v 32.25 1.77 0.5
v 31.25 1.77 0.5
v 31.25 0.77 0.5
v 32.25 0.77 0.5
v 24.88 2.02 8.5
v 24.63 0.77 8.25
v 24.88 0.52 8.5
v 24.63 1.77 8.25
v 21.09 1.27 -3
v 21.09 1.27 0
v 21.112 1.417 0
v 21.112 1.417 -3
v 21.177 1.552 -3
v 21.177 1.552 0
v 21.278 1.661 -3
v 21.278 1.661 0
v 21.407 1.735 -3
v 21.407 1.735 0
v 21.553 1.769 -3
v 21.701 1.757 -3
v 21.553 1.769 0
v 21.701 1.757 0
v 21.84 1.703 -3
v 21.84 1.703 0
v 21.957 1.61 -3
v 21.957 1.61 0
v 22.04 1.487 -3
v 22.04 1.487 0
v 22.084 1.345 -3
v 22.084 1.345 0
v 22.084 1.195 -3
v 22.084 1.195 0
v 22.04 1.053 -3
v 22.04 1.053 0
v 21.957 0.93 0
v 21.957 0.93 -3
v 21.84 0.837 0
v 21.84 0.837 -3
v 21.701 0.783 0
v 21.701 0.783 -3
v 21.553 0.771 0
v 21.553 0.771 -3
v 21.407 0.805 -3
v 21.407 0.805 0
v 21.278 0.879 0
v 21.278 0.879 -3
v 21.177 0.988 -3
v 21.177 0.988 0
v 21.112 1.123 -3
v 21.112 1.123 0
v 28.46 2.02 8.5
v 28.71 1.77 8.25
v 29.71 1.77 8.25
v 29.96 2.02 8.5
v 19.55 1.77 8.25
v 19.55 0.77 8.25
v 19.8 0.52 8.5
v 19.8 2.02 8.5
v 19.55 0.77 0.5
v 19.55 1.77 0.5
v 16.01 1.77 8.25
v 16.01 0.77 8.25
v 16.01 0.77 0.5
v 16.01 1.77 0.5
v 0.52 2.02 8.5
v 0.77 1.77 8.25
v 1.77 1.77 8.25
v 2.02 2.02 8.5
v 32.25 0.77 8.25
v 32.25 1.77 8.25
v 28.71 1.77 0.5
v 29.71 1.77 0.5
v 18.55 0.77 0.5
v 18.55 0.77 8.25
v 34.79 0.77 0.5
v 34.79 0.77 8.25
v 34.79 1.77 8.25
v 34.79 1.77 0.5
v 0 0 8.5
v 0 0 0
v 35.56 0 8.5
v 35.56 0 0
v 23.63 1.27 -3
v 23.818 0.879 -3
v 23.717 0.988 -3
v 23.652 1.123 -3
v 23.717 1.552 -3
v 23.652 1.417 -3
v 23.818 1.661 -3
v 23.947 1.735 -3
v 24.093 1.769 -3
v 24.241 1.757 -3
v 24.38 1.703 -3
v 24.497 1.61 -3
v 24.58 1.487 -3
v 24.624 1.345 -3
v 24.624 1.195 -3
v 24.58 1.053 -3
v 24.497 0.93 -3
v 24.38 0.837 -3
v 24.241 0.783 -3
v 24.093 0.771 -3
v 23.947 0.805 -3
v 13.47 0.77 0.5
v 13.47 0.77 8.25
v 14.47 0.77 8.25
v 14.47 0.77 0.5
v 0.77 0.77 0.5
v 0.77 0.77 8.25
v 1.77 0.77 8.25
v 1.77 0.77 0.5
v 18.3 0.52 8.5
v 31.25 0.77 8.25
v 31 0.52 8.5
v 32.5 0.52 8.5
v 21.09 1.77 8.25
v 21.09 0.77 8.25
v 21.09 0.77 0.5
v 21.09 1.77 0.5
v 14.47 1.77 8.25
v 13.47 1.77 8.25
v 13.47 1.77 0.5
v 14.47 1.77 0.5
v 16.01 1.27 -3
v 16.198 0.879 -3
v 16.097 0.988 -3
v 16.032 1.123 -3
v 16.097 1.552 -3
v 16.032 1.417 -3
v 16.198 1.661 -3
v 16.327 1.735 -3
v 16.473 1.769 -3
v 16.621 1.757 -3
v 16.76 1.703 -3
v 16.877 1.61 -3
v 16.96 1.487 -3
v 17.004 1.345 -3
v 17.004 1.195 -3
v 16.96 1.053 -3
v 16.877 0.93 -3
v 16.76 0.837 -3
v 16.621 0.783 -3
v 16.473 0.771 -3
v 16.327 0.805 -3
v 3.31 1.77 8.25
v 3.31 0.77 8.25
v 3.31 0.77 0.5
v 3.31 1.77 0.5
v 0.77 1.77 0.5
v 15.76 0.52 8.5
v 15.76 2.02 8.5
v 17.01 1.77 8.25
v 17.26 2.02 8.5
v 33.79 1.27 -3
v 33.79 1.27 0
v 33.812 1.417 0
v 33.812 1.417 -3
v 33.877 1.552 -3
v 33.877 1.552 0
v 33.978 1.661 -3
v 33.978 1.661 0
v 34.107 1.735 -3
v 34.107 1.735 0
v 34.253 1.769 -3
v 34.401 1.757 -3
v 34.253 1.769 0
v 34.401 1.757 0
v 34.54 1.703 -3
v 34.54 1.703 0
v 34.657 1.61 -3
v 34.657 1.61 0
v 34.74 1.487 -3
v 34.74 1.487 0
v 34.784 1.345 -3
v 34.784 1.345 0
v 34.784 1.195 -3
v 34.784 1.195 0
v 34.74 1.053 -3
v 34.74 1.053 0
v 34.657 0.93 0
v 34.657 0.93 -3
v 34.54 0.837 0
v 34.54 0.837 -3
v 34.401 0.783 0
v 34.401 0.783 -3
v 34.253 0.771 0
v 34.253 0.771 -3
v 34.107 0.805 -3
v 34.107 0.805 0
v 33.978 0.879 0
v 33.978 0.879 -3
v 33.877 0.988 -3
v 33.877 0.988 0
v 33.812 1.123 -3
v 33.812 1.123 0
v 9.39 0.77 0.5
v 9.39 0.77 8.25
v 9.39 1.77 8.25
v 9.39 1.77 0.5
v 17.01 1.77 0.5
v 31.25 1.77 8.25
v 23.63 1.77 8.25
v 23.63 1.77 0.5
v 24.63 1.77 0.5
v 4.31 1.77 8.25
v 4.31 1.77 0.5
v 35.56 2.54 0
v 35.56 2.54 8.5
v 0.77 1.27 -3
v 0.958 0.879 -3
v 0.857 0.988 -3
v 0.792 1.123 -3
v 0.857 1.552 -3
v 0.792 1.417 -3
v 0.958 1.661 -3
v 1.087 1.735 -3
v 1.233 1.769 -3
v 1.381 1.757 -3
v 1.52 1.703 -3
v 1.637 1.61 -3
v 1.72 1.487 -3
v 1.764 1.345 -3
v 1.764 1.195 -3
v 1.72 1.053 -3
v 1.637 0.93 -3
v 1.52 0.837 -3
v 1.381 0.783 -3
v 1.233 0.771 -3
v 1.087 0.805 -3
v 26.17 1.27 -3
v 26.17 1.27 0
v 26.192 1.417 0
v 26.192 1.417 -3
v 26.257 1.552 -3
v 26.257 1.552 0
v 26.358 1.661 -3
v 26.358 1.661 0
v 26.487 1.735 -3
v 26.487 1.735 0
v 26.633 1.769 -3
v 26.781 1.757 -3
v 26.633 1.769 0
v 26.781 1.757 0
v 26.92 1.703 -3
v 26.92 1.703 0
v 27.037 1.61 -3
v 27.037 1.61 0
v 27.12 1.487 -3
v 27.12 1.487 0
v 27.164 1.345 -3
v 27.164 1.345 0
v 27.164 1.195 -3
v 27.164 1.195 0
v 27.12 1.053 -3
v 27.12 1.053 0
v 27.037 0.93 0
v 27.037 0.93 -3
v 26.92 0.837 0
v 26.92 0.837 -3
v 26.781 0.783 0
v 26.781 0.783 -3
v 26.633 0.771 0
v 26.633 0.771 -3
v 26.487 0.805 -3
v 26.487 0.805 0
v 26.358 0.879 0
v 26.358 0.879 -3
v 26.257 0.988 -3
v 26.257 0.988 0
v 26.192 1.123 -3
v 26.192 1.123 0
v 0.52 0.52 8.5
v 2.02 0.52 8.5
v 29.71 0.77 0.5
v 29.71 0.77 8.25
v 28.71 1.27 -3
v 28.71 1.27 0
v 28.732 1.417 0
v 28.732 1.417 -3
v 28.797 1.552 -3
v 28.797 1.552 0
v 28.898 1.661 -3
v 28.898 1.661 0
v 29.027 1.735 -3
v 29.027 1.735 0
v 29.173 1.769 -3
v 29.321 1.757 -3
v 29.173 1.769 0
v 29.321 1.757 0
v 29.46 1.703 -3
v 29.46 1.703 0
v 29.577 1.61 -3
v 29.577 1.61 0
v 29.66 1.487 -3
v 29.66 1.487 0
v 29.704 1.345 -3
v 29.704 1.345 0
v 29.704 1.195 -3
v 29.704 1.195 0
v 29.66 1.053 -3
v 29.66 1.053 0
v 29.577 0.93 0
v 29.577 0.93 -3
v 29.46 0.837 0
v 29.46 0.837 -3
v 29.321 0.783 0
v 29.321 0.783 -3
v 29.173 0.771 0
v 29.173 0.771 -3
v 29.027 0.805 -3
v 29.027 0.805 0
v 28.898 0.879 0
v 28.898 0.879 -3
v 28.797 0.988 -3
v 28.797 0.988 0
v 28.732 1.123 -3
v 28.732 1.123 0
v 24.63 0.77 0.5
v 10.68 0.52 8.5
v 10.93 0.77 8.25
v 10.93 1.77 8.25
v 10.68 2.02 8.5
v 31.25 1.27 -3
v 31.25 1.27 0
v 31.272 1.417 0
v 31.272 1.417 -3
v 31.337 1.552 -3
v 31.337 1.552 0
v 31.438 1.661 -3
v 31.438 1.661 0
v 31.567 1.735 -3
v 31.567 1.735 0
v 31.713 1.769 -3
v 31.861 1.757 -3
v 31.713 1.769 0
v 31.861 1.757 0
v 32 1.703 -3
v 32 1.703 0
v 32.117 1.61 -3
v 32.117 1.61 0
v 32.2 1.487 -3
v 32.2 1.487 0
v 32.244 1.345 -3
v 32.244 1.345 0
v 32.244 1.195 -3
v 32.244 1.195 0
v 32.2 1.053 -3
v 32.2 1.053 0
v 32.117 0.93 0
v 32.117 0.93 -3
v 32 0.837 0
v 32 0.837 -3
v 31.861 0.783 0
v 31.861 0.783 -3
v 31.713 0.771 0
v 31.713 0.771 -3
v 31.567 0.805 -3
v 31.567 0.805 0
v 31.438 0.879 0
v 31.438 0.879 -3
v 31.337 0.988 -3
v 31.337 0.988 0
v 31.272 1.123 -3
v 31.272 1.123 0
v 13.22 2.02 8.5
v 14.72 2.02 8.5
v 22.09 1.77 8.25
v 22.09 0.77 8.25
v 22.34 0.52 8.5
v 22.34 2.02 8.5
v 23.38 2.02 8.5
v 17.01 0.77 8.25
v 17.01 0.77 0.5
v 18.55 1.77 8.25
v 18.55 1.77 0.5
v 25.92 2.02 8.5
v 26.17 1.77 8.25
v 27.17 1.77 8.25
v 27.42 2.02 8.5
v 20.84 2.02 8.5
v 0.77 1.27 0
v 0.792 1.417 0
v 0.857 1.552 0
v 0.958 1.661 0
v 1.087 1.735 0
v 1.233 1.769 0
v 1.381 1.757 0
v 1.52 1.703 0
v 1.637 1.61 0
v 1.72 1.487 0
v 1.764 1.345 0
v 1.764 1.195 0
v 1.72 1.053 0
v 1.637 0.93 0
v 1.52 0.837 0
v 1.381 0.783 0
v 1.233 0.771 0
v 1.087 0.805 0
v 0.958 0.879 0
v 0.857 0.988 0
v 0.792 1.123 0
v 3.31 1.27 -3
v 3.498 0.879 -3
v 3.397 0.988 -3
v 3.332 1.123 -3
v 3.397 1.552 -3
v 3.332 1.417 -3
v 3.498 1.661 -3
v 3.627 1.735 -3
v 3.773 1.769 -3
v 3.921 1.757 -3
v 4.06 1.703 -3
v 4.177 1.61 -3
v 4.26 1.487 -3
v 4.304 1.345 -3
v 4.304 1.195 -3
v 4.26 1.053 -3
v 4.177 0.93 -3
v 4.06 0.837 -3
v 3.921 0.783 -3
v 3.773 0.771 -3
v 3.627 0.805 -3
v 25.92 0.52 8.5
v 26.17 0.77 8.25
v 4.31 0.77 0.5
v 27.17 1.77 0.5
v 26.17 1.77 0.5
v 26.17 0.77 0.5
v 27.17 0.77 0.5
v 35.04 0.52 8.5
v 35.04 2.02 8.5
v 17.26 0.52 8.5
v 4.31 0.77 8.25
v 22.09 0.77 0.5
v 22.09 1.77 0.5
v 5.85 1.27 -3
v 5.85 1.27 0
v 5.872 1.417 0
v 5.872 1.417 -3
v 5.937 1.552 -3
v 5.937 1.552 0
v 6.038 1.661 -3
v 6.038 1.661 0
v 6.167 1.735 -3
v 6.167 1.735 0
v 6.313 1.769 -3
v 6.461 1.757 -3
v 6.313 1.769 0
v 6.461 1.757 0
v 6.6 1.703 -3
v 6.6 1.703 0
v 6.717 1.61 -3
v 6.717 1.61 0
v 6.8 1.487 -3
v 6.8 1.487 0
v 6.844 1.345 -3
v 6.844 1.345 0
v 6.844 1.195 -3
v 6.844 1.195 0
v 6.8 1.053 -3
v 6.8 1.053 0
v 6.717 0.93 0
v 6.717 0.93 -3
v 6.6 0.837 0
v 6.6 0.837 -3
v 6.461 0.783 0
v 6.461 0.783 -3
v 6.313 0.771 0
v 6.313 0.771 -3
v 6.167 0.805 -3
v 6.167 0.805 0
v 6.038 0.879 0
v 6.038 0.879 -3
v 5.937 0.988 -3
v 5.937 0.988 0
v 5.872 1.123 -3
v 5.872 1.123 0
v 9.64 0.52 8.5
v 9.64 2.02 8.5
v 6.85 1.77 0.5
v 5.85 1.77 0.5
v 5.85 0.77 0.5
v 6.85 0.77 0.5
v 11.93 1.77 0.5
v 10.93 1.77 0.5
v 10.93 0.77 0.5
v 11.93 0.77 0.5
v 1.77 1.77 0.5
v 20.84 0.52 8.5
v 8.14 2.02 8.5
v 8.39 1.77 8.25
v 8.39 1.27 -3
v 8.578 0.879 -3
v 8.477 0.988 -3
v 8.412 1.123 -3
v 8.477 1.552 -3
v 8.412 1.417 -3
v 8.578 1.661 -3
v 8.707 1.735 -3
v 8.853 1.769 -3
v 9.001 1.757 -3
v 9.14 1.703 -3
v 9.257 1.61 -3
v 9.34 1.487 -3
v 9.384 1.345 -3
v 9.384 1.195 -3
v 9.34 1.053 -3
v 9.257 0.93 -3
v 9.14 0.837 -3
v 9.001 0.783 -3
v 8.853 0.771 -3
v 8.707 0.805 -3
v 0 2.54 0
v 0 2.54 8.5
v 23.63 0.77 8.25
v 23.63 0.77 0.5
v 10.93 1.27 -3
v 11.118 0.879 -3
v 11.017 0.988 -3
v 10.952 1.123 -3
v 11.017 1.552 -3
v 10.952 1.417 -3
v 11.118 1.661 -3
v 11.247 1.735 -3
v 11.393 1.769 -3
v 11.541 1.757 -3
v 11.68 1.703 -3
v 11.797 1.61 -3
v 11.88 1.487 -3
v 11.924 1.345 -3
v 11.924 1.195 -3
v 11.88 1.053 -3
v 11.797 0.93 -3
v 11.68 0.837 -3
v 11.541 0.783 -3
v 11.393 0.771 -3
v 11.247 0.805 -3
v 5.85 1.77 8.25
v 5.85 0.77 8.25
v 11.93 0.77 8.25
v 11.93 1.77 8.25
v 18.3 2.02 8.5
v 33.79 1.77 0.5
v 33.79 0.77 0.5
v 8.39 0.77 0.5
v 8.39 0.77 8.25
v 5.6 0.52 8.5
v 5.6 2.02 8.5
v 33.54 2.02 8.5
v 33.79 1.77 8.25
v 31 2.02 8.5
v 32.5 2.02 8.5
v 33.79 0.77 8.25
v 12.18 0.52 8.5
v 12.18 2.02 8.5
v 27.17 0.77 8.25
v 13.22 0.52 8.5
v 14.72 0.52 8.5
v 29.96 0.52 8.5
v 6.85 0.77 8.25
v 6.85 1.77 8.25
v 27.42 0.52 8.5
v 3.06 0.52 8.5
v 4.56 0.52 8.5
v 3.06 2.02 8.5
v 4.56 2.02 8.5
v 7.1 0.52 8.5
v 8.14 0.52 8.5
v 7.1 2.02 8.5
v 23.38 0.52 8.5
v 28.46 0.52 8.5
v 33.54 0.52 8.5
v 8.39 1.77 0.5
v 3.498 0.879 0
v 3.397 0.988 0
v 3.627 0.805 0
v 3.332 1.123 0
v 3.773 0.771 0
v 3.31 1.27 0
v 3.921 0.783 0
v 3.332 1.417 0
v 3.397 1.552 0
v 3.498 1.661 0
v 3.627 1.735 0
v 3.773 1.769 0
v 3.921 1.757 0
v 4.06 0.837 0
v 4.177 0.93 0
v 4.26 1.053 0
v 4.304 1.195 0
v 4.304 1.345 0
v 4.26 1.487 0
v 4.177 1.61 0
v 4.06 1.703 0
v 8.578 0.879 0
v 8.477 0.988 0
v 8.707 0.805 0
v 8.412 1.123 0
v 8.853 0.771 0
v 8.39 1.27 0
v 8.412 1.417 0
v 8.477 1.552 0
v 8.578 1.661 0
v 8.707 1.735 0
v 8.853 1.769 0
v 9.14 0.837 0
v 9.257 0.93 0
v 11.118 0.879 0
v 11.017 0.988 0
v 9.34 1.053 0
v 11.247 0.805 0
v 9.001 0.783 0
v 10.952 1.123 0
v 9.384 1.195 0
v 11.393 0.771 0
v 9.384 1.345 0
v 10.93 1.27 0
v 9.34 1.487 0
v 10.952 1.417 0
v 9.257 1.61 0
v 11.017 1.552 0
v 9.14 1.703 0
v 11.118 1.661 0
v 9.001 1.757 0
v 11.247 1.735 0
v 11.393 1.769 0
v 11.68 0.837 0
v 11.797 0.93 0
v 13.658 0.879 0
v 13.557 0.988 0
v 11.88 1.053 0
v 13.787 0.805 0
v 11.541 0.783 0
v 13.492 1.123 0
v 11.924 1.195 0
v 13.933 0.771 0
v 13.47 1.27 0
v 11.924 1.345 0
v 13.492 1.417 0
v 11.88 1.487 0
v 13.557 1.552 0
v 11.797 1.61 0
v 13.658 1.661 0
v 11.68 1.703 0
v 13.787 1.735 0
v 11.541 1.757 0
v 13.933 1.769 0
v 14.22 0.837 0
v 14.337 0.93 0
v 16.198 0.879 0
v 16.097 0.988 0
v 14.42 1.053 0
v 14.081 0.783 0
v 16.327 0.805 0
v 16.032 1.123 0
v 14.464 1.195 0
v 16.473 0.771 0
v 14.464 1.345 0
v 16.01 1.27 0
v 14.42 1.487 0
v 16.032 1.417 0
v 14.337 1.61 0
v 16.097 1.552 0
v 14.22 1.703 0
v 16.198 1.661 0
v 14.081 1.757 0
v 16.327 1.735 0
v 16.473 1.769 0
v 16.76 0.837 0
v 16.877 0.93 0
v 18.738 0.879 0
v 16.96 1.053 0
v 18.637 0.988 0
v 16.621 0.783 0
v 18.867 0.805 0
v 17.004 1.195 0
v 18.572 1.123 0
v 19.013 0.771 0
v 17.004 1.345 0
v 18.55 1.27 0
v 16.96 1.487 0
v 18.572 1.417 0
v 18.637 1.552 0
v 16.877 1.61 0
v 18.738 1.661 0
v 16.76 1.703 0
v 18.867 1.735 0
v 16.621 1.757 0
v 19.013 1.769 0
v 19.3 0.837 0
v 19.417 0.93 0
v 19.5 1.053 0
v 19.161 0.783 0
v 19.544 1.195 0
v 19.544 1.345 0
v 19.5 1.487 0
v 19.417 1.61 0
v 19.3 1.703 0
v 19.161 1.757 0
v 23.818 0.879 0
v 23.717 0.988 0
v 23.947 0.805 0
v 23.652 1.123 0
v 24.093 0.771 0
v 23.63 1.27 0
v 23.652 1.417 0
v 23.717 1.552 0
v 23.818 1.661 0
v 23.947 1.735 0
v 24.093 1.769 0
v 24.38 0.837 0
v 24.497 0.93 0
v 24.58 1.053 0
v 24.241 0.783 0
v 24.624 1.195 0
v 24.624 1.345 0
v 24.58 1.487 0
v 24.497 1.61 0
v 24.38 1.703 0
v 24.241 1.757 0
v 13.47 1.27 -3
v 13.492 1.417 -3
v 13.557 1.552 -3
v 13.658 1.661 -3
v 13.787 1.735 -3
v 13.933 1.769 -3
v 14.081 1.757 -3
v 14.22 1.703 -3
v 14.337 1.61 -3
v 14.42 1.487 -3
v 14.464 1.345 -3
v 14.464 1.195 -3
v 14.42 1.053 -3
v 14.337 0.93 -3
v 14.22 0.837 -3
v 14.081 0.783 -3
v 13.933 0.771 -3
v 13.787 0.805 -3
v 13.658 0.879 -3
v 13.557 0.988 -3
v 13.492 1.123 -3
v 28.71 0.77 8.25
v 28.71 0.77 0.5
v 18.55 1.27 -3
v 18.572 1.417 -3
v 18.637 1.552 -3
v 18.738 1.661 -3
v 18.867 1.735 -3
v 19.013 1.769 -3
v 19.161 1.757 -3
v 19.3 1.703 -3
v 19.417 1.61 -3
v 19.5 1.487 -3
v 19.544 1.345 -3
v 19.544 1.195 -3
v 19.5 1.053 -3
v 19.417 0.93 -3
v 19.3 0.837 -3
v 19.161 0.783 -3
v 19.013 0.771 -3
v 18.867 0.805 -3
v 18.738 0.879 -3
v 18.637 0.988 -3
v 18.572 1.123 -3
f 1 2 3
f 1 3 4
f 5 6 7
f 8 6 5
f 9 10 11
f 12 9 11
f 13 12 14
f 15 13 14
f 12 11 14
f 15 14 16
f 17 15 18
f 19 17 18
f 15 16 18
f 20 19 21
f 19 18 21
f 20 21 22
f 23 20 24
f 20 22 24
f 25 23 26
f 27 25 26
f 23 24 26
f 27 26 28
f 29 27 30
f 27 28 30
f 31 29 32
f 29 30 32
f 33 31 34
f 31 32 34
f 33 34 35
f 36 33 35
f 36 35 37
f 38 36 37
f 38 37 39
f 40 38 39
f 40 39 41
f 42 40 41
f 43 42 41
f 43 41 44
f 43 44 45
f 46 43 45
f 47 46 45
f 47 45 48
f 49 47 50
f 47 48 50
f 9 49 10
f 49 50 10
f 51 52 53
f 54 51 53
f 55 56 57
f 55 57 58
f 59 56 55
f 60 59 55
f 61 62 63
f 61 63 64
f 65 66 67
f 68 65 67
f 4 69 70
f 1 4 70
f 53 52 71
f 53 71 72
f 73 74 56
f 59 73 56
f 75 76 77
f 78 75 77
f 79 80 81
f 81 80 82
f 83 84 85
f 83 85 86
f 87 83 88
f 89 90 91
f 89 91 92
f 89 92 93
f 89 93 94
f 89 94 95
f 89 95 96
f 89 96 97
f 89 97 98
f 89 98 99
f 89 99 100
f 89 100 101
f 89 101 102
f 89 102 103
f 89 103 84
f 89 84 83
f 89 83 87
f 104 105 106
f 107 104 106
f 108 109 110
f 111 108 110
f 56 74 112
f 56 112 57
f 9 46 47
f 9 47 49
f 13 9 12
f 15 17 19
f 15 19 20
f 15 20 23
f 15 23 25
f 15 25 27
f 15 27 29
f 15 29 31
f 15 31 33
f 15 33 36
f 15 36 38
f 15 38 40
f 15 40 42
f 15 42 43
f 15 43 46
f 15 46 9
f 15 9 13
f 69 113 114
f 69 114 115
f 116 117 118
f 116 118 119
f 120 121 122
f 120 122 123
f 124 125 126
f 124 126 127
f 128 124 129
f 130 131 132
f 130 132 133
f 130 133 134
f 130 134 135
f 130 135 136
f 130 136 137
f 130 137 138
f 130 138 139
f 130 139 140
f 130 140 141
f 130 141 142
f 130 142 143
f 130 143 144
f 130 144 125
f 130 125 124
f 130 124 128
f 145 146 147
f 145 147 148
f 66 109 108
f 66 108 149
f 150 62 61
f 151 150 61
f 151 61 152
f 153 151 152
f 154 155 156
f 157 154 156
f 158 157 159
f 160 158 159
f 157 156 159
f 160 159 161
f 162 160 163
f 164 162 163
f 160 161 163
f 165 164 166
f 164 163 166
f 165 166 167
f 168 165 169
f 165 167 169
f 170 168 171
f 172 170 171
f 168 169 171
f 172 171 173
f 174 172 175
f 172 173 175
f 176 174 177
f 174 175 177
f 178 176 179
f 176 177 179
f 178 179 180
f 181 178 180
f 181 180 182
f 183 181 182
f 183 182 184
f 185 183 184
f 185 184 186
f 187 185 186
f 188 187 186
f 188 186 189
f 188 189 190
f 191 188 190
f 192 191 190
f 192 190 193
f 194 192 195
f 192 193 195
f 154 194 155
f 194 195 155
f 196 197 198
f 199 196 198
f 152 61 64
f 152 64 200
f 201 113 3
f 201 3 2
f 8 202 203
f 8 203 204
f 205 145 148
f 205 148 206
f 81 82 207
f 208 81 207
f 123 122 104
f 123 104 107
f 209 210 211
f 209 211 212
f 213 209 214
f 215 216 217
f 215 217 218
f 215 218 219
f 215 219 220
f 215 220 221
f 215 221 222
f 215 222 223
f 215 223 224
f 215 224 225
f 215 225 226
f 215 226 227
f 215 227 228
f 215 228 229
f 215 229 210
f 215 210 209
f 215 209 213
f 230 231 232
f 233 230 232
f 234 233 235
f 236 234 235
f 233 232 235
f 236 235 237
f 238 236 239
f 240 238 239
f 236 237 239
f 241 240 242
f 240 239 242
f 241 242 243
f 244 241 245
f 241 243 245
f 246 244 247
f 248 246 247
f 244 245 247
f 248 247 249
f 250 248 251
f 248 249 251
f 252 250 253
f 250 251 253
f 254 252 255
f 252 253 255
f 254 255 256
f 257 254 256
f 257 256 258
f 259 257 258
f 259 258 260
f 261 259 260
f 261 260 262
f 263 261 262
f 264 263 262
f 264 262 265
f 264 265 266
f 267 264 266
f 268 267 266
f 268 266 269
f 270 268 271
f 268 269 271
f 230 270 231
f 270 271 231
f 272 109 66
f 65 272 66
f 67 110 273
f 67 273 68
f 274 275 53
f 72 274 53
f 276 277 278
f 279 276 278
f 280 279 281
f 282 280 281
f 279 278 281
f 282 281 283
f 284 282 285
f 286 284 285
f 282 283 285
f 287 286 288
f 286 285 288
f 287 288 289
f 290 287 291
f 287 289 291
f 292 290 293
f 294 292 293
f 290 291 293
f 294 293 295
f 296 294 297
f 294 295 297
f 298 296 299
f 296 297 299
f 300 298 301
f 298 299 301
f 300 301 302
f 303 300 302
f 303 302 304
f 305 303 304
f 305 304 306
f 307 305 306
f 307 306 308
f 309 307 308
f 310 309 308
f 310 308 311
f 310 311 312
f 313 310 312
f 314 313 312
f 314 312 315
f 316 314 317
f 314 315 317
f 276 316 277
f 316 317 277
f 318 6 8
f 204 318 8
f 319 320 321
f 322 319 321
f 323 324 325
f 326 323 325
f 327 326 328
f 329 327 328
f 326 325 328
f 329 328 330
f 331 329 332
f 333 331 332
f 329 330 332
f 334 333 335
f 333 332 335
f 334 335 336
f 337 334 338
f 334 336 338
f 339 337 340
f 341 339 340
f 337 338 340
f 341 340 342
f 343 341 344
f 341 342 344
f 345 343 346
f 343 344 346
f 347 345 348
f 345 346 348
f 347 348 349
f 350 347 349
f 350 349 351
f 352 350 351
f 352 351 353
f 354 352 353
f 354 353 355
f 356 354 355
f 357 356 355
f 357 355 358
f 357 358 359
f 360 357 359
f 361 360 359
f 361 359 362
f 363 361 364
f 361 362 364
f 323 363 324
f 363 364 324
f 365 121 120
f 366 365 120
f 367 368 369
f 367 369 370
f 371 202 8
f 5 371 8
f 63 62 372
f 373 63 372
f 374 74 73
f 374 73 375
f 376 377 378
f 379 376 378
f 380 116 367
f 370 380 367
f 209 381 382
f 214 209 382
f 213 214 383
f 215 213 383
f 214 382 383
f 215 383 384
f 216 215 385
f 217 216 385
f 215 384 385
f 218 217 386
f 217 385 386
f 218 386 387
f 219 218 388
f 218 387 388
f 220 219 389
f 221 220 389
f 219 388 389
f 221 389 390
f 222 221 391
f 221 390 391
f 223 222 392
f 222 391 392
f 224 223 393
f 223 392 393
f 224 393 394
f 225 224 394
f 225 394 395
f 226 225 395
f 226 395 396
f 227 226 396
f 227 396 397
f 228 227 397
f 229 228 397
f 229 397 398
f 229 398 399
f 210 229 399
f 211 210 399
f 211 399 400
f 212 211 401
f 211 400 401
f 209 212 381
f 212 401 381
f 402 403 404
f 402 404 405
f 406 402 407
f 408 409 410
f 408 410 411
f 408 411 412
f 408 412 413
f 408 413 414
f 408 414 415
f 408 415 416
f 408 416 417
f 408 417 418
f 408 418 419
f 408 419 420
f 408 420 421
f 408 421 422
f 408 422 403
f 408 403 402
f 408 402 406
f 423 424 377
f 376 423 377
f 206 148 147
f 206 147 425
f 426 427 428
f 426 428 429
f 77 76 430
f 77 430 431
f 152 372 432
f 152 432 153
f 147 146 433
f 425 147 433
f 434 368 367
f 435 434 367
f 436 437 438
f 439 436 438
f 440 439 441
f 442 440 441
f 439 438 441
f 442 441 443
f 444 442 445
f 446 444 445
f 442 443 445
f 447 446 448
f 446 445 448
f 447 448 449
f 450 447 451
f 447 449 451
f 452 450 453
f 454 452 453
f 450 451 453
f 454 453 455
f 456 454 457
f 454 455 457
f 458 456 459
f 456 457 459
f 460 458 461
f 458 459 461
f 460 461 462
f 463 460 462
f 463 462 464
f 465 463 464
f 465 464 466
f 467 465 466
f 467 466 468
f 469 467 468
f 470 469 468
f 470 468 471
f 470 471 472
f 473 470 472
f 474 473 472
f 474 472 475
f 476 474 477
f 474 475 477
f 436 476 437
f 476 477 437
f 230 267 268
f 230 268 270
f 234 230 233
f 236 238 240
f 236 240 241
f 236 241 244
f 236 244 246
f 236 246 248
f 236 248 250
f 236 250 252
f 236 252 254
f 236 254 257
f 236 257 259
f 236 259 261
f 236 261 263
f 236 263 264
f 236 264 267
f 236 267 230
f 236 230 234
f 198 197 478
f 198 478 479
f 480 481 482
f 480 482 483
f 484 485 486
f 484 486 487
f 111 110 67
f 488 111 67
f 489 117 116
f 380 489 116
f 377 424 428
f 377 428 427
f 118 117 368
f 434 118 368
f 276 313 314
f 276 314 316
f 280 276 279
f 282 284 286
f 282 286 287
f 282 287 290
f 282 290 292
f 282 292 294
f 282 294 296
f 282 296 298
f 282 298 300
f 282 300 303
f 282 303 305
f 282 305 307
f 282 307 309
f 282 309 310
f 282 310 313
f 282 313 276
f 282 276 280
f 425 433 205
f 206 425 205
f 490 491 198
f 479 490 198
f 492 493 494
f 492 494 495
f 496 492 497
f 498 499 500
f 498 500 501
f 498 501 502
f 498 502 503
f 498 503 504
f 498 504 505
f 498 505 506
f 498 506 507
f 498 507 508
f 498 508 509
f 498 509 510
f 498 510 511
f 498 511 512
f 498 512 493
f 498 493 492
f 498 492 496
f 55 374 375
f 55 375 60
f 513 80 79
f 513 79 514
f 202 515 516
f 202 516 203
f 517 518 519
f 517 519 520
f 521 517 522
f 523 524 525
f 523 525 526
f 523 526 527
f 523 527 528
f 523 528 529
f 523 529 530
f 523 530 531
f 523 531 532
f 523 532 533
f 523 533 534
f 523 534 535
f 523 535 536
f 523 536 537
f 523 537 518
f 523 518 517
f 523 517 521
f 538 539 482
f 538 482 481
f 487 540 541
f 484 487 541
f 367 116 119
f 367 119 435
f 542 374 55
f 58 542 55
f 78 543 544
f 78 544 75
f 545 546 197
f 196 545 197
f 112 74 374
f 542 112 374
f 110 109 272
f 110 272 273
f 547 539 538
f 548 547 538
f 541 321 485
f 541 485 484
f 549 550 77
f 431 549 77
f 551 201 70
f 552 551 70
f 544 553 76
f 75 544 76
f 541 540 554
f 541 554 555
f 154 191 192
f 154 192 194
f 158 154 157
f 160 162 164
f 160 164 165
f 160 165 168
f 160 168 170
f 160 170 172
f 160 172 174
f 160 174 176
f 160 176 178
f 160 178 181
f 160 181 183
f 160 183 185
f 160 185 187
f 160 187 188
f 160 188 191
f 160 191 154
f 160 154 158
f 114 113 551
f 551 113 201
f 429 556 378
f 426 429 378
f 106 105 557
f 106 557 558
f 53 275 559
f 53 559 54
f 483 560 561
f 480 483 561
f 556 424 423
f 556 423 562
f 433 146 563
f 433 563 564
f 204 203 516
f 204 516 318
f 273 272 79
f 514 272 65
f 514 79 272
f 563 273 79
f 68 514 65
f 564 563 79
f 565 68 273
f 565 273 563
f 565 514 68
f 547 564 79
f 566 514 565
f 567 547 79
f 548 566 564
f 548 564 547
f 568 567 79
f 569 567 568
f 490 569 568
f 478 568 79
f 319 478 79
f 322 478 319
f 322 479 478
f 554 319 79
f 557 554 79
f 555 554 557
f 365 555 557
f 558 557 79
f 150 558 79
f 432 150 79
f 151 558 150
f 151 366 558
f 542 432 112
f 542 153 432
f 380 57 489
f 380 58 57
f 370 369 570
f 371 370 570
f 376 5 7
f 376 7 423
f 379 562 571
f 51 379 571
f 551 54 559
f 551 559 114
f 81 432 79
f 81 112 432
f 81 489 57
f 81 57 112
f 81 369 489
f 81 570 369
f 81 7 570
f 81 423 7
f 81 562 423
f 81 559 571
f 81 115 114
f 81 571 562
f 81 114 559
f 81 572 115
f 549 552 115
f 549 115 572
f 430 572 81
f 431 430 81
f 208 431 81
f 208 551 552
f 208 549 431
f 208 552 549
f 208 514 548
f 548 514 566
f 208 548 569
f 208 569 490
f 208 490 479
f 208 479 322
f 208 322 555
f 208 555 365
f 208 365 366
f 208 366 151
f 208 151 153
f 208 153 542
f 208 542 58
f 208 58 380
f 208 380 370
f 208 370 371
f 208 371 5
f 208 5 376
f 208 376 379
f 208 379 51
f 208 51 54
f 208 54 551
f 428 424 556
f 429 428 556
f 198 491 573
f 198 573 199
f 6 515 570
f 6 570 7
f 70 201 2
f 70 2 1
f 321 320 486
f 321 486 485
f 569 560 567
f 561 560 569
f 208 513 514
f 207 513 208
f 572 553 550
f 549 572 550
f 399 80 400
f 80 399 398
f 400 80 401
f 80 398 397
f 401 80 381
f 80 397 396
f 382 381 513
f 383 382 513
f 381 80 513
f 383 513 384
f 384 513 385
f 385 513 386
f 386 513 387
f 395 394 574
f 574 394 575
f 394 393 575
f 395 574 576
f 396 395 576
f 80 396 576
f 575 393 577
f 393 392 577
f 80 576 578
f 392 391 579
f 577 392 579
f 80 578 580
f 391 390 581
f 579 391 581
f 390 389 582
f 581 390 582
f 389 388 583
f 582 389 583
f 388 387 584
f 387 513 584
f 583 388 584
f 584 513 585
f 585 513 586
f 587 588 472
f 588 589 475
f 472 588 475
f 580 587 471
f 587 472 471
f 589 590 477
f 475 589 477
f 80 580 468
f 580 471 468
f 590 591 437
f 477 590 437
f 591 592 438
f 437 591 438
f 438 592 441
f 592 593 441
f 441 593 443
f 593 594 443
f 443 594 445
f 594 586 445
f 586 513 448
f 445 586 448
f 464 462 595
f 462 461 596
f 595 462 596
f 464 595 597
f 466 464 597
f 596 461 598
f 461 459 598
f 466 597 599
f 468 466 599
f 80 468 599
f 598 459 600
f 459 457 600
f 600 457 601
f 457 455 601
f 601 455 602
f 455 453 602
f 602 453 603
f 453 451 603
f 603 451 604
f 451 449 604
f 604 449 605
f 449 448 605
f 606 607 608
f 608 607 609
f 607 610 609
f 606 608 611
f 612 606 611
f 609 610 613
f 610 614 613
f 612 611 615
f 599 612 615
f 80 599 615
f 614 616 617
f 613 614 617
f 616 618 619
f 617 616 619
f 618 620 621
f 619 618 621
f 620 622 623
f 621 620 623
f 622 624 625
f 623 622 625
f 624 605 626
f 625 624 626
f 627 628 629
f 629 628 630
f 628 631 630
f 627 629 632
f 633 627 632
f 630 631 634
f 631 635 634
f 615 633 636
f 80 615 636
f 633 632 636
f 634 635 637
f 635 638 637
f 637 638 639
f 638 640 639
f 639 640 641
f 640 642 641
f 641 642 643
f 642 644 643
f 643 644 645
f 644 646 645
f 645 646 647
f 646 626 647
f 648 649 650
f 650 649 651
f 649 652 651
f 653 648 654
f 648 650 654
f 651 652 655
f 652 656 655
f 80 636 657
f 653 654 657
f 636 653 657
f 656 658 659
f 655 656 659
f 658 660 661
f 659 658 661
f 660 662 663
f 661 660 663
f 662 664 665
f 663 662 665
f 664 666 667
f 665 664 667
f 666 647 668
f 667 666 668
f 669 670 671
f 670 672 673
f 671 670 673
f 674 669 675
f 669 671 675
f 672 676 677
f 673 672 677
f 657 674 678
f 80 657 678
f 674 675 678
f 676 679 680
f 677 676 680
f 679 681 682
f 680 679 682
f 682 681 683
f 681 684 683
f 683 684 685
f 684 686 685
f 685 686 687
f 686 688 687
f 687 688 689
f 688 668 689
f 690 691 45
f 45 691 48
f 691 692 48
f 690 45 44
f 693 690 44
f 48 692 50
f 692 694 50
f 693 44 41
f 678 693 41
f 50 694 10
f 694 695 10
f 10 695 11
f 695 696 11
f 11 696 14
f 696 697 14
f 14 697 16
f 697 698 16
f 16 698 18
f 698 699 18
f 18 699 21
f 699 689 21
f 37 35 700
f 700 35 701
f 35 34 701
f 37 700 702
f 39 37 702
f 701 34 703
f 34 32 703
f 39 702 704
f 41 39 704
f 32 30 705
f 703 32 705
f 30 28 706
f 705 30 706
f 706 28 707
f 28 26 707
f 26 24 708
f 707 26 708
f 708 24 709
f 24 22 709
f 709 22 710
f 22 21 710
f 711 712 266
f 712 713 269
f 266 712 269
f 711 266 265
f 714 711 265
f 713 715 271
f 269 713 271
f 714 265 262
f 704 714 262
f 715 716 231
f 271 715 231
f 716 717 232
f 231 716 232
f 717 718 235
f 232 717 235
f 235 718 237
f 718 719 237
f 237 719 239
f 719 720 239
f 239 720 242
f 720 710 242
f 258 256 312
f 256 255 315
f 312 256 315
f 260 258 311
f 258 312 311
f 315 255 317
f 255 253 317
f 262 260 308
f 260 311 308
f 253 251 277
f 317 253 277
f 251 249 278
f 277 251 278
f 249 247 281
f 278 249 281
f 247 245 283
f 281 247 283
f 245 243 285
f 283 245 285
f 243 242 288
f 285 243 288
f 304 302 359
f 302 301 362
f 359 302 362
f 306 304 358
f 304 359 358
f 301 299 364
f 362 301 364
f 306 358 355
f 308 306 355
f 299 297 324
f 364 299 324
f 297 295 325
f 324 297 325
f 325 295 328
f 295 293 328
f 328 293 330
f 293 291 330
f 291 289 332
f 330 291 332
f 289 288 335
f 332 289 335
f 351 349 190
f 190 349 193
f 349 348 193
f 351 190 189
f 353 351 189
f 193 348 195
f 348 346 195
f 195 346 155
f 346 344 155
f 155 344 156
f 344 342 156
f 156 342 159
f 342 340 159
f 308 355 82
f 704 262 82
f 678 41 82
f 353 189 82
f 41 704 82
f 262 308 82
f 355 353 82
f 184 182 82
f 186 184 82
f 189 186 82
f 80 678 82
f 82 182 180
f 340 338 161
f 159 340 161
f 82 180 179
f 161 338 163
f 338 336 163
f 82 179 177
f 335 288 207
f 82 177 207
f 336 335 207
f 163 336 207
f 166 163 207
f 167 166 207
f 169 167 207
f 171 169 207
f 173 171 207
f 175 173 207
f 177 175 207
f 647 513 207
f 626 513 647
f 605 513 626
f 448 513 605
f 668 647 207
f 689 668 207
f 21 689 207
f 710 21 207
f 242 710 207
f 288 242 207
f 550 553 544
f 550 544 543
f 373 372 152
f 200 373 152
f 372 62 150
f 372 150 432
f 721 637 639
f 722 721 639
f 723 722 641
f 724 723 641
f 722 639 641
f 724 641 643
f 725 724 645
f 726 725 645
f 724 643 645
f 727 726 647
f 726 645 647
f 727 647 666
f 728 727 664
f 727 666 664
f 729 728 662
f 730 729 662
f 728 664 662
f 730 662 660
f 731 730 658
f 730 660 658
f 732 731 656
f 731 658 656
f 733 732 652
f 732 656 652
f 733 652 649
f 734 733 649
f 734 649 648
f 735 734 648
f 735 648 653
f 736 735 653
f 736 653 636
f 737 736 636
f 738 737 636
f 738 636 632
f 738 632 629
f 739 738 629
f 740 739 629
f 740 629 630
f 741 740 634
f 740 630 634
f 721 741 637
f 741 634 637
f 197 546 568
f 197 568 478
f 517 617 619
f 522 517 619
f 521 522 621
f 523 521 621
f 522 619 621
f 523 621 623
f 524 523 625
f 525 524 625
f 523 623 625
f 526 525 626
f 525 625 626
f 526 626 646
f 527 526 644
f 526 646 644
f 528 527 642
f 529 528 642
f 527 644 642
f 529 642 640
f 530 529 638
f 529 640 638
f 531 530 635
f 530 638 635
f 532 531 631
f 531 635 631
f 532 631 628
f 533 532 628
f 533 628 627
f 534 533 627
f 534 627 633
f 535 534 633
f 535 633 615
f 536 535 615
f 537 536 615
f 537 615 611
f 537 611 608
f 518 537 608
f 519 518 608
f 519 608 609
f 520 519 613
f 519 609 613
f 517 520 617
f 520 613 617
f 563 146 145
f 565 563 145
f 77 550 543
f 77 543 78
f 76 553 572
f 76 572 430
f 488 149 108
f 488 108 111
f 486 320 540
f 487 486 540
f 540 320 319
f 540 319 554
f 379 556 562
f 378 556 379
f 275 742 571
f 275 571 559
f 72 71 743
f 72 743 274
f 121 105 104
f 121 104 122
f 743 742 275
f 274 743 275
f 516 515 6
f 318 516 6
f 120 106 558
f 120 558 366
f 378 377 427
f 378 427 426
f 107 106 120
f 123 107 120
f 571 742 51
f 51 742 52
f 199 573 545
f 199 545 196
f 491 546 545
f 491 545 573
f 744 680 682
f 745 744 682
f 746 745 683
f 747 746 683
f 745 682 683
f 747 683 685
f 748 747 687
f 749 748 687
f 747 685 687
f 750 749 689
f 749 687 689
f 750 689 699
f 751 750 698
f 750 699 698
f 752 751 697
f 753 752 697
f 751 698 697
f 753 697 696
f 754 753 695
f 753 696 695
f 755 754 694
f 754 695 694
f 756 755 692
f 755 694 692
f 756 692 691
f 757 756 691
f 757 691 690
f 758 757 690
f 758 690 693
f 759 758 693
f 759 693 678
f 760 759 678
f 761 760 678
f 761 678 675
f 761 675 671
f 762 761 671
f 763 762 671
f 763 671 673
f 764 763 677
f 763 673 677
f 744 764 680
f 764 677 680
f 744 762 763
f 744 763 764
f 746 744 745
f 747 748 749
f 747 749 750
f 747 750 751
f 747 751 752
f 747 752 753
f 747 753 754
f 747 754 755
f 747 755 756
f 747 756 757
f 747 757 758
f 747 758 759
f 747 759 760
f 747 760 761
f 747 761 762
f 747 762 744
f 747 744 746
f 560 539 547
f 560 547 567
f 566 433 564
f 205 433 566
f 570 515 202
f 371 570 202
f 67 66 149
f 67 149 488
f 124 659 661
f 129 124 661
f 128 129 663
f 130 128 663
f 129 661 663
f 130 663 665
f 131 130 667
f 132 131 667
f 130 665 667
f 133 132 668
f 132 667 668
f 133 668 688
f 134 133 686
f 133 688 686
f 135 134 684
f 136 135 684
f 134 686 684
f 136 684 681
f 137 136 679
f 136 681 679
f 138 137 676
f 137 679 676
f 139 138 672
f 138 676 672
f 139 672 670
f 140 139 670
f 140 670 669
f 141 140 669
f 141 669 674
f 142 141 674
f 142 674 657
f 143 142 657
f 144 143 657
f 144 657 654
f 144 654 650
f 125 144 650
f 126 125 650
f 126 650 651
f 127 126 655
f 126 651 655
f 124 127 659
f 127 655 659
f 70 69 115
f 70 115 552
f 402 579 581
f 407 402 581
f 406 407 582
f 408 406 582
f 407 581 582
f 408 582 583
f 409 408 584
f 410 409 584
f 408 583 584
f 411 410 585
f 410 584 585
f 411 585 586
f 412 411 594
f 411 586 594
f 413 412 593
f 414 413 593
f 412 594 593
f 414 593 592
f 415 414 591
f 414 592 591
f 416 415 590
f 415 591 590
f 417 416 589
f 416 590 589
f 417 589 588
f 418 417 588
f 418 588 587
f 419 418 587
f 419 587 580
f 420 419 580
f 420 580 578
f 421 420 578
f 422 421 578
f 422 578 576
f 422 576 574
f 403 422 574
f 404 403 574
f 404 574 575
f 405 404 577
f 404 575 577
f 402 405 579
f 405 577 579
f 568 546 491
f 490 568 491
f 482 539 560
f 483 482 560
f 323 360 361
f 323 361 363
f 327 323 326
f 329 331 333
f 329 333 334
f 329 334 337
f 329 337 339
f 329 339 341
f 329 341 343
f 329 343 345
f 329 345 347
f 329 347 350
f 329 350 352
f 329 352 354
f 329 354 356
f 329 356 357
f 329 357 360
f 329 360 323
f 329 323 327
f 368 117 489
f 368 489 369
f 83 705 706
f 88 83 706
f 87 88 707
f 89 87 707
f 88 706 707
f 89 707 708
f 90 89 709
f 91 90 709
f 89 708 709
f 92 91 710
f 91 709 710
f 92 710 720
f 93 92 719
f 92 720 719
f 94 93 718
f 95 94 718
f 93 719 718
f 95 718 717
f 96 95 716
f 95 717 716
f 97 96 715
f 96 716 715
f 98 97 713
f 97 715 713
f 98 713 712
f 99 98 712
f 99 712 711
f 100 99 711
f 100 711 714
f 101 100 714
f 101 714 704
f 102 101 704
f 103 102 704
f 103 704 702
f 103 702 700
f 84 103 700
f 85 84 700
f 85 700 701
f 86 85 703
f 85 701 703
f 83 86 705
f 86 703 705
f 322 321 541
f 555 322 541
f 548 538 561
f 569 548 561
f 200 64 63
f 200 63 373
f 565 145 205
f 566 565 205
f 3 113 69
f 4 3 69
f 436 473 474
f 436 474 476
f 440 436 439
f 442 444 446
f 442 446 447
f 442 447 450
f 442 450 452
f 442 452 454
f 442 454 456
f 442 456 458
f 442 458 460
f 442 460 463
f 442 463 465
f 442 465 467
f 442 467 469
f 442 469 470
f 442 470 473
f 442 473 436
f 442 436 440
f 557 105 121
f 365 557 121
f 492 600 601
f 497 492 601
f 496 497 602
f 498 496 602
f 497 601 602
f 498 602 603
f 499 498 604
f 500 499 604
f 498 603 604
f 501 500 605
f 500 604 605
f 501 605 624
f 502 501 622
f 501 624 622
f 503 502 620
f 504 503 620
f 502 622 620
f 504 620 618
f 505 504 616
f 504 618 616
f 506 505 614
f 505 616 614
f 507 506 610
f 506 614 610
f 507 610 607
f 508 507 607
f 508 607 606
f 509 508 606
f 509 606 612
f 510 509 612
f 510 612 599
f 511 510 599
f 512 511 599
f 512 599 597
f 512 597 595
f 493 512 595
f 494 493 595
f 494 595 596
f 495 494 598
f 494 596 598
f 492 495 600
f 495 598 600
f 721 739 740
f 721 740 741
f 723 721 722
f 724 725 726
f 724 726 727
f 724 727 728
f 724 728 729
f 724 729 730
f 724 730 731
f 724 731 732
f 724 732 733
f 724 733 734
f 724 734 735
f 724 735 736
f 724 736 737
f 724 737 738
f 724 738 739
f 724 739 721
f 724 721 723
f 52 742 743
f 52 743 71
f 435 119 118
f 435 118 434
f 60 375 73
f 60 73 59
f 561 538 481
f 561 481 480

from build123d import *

# Parameters (mm, degrees)
SKETCH1_W                  = 35.56
SKETCH1_H                  = 2.54
BOSS_EXTRUDE1_DEPTH        = 8.5
SKETCH2_W                  = 1
SKETCH2_H                  = 1
CUT_EXTRUDE1_DEPTH         = 8
CHAMFER1_SIZE              = 0.25
LPATTERN2_COUNT            = 14
LPATTERN2_PITCH            = 2.54
CHAMFER1_OF_LPATTERN2_SIZE = 0.25
SKETCH3_R                  = 0.5
BOSS_EXTRUDE2_DEPTH        = 3
LPATTERN3_COUNT            = 14
LPATTERN3_PITCH            = 2.54


with BuildPart() as part:
    # Sketch1 → Boss-Extrude1 (new body)
    with BuildSketch(Plane.XY):
        with Locations((17.78, 1.27)):
            Rectangle(SKETCH1_W, SKETCH1_H)
    extrude(amount=BOSS_EXTRUDE1_DEPTH)

    # Sketch2 → Cut-Extrude1 (cut)
    with BuildSketch(Plane.XY.offset(8.5)):
        with Locations((1.27, 1.27)):
            Rectangle(SKETCH2_W, SKETCH2_H)
    cut_extrude1 = extrude(amount=-CUT_EXTRUDE1_DEPTH, mode=Mode.SUBTRACT)

    # Chamfer1
    chamfer1_edges = [part.edges().sort_by_distance(p)[0] for p in [
        (0.77, 1.27, 8.5),
        (1.27, 0.77, 8.5),
        (1.77, 1.27, 8.5),
        (1.27, 1.77, 8.5),
    ]]
    chamfer(chamfer1_edges, length=CHAMFER1_SIZE)

    # LPattern2: Cut-Extrude1 ×14
    with Locations(*[(i * LPATTERN2_PITCH, 0, 0) for i in range(1, LPATTERN2_COUNT)]):
        add(cut_extrude1, mode=Mode.SUBTRACT)

    # Chamfer1 of LPattern2
    chamfer1_of_lpattern2_edges = [part.edges().sort_by_distance(p)[0] for p in [
        (3.31, 1.27, 8.5),
        (3.81, 0.77, 8.5),
        (4.31, 1.27, 8.5),
        (3.81, 1.77, 8.5),
        (5.85, 1.27, 8.5),
        (6.35, 0.77, 8.5),
        (6.85, 1.27, 8.5),
        (6.35, 1.77, 8.5),
        (8.39, 1.27, 8.5),
        (8.89, 0.77, 8.5),
        (9.39, 1.27, 8.5),
        (8.89, 1.77, 8.5),
        (10.93, 1.27, 8.5),
        (11.43, 0.77, 8.5),
        (11.93, 1.27, 8.5),
        (11.43, 1.77, 8.5),
        (13.47, 1.27, 8.5),
        (13.97, 0.77, 8.5),
        (14.47, 1.27, 8.5),
        (13.97, 1.77, 8.5),
        (16.01, 1.27, 8.5),
        (16.51, 0.77, 8.5),
        (17.01, 1.27, 8.5),
        (16.51, 1.77, 8.5),
        (18.55, 1.27, 8.5),
        (19.05, 0.77, 8.5),
        (19.55, 1.27, 8.5),
        (19.05, 1.77, 8.5),
        (21.09, 1.27, 8.5),
        (21.59, 0.77, 8.5),
        (22.09, 1.27, 8.5),
        (21.59, 1.77, 8.5),
        (23.63, 1.27, 8.5),
        (24.13, 0.77, 8.5),
        (24.63, 1.27, 8.5),
        (24.13, 1.77, 8.5),
        (26.17, 1.27, 8.5),
        (26.67, 0.77, 8.5),
        (27.17, 1.27, 8.5),
        (26.67, 1.77, 8.5),
        (28.71, 1.27, 8.5),
        (29.21, 0.77, 8.5),
        (29.71, 1.27, 8.5),
        (29.21, 1.77, 8.5),
        (31.25, 1.27, 8.5),
        (31.75, 0.77, 8.5),
        (32.25, 1.27, 8.5),
        (31.75, 1.77, 8.5),
        (33.79, 1.27, 8.5),
        (34.29, 0.77, 8.5),
        (34.79, 1.27, 8.5),
        (34.29, 1.77, 8.5),
    ]]
    chamfer(chamfer1_of_lpattern2_edges, length=CHAMFER1_OF_LPATTERN2_SIZE)

    # Sketch3 → Boss-Extrude2 (add)
    with BuildSketch(Plane(origin=(0, 0, 0), x_dir=(-1, 0, 0), z_dir=(0, 0, -1))):
        with Locations((-1.27, 1.27)):
            Circle(SKETCH3_R)
    boss_extrude2 = extrude(amount=BOSS_EXTRUDE2_DEPTH)

    # LPattern3: Boss-Extrude2 ×14
    with Locations(*[(i * LPATTERN3_PITCH, 0, 0) for i in range(1, LPATTERN3_COUNT)]):
        add(boss_extrude2)


solid = part.part
